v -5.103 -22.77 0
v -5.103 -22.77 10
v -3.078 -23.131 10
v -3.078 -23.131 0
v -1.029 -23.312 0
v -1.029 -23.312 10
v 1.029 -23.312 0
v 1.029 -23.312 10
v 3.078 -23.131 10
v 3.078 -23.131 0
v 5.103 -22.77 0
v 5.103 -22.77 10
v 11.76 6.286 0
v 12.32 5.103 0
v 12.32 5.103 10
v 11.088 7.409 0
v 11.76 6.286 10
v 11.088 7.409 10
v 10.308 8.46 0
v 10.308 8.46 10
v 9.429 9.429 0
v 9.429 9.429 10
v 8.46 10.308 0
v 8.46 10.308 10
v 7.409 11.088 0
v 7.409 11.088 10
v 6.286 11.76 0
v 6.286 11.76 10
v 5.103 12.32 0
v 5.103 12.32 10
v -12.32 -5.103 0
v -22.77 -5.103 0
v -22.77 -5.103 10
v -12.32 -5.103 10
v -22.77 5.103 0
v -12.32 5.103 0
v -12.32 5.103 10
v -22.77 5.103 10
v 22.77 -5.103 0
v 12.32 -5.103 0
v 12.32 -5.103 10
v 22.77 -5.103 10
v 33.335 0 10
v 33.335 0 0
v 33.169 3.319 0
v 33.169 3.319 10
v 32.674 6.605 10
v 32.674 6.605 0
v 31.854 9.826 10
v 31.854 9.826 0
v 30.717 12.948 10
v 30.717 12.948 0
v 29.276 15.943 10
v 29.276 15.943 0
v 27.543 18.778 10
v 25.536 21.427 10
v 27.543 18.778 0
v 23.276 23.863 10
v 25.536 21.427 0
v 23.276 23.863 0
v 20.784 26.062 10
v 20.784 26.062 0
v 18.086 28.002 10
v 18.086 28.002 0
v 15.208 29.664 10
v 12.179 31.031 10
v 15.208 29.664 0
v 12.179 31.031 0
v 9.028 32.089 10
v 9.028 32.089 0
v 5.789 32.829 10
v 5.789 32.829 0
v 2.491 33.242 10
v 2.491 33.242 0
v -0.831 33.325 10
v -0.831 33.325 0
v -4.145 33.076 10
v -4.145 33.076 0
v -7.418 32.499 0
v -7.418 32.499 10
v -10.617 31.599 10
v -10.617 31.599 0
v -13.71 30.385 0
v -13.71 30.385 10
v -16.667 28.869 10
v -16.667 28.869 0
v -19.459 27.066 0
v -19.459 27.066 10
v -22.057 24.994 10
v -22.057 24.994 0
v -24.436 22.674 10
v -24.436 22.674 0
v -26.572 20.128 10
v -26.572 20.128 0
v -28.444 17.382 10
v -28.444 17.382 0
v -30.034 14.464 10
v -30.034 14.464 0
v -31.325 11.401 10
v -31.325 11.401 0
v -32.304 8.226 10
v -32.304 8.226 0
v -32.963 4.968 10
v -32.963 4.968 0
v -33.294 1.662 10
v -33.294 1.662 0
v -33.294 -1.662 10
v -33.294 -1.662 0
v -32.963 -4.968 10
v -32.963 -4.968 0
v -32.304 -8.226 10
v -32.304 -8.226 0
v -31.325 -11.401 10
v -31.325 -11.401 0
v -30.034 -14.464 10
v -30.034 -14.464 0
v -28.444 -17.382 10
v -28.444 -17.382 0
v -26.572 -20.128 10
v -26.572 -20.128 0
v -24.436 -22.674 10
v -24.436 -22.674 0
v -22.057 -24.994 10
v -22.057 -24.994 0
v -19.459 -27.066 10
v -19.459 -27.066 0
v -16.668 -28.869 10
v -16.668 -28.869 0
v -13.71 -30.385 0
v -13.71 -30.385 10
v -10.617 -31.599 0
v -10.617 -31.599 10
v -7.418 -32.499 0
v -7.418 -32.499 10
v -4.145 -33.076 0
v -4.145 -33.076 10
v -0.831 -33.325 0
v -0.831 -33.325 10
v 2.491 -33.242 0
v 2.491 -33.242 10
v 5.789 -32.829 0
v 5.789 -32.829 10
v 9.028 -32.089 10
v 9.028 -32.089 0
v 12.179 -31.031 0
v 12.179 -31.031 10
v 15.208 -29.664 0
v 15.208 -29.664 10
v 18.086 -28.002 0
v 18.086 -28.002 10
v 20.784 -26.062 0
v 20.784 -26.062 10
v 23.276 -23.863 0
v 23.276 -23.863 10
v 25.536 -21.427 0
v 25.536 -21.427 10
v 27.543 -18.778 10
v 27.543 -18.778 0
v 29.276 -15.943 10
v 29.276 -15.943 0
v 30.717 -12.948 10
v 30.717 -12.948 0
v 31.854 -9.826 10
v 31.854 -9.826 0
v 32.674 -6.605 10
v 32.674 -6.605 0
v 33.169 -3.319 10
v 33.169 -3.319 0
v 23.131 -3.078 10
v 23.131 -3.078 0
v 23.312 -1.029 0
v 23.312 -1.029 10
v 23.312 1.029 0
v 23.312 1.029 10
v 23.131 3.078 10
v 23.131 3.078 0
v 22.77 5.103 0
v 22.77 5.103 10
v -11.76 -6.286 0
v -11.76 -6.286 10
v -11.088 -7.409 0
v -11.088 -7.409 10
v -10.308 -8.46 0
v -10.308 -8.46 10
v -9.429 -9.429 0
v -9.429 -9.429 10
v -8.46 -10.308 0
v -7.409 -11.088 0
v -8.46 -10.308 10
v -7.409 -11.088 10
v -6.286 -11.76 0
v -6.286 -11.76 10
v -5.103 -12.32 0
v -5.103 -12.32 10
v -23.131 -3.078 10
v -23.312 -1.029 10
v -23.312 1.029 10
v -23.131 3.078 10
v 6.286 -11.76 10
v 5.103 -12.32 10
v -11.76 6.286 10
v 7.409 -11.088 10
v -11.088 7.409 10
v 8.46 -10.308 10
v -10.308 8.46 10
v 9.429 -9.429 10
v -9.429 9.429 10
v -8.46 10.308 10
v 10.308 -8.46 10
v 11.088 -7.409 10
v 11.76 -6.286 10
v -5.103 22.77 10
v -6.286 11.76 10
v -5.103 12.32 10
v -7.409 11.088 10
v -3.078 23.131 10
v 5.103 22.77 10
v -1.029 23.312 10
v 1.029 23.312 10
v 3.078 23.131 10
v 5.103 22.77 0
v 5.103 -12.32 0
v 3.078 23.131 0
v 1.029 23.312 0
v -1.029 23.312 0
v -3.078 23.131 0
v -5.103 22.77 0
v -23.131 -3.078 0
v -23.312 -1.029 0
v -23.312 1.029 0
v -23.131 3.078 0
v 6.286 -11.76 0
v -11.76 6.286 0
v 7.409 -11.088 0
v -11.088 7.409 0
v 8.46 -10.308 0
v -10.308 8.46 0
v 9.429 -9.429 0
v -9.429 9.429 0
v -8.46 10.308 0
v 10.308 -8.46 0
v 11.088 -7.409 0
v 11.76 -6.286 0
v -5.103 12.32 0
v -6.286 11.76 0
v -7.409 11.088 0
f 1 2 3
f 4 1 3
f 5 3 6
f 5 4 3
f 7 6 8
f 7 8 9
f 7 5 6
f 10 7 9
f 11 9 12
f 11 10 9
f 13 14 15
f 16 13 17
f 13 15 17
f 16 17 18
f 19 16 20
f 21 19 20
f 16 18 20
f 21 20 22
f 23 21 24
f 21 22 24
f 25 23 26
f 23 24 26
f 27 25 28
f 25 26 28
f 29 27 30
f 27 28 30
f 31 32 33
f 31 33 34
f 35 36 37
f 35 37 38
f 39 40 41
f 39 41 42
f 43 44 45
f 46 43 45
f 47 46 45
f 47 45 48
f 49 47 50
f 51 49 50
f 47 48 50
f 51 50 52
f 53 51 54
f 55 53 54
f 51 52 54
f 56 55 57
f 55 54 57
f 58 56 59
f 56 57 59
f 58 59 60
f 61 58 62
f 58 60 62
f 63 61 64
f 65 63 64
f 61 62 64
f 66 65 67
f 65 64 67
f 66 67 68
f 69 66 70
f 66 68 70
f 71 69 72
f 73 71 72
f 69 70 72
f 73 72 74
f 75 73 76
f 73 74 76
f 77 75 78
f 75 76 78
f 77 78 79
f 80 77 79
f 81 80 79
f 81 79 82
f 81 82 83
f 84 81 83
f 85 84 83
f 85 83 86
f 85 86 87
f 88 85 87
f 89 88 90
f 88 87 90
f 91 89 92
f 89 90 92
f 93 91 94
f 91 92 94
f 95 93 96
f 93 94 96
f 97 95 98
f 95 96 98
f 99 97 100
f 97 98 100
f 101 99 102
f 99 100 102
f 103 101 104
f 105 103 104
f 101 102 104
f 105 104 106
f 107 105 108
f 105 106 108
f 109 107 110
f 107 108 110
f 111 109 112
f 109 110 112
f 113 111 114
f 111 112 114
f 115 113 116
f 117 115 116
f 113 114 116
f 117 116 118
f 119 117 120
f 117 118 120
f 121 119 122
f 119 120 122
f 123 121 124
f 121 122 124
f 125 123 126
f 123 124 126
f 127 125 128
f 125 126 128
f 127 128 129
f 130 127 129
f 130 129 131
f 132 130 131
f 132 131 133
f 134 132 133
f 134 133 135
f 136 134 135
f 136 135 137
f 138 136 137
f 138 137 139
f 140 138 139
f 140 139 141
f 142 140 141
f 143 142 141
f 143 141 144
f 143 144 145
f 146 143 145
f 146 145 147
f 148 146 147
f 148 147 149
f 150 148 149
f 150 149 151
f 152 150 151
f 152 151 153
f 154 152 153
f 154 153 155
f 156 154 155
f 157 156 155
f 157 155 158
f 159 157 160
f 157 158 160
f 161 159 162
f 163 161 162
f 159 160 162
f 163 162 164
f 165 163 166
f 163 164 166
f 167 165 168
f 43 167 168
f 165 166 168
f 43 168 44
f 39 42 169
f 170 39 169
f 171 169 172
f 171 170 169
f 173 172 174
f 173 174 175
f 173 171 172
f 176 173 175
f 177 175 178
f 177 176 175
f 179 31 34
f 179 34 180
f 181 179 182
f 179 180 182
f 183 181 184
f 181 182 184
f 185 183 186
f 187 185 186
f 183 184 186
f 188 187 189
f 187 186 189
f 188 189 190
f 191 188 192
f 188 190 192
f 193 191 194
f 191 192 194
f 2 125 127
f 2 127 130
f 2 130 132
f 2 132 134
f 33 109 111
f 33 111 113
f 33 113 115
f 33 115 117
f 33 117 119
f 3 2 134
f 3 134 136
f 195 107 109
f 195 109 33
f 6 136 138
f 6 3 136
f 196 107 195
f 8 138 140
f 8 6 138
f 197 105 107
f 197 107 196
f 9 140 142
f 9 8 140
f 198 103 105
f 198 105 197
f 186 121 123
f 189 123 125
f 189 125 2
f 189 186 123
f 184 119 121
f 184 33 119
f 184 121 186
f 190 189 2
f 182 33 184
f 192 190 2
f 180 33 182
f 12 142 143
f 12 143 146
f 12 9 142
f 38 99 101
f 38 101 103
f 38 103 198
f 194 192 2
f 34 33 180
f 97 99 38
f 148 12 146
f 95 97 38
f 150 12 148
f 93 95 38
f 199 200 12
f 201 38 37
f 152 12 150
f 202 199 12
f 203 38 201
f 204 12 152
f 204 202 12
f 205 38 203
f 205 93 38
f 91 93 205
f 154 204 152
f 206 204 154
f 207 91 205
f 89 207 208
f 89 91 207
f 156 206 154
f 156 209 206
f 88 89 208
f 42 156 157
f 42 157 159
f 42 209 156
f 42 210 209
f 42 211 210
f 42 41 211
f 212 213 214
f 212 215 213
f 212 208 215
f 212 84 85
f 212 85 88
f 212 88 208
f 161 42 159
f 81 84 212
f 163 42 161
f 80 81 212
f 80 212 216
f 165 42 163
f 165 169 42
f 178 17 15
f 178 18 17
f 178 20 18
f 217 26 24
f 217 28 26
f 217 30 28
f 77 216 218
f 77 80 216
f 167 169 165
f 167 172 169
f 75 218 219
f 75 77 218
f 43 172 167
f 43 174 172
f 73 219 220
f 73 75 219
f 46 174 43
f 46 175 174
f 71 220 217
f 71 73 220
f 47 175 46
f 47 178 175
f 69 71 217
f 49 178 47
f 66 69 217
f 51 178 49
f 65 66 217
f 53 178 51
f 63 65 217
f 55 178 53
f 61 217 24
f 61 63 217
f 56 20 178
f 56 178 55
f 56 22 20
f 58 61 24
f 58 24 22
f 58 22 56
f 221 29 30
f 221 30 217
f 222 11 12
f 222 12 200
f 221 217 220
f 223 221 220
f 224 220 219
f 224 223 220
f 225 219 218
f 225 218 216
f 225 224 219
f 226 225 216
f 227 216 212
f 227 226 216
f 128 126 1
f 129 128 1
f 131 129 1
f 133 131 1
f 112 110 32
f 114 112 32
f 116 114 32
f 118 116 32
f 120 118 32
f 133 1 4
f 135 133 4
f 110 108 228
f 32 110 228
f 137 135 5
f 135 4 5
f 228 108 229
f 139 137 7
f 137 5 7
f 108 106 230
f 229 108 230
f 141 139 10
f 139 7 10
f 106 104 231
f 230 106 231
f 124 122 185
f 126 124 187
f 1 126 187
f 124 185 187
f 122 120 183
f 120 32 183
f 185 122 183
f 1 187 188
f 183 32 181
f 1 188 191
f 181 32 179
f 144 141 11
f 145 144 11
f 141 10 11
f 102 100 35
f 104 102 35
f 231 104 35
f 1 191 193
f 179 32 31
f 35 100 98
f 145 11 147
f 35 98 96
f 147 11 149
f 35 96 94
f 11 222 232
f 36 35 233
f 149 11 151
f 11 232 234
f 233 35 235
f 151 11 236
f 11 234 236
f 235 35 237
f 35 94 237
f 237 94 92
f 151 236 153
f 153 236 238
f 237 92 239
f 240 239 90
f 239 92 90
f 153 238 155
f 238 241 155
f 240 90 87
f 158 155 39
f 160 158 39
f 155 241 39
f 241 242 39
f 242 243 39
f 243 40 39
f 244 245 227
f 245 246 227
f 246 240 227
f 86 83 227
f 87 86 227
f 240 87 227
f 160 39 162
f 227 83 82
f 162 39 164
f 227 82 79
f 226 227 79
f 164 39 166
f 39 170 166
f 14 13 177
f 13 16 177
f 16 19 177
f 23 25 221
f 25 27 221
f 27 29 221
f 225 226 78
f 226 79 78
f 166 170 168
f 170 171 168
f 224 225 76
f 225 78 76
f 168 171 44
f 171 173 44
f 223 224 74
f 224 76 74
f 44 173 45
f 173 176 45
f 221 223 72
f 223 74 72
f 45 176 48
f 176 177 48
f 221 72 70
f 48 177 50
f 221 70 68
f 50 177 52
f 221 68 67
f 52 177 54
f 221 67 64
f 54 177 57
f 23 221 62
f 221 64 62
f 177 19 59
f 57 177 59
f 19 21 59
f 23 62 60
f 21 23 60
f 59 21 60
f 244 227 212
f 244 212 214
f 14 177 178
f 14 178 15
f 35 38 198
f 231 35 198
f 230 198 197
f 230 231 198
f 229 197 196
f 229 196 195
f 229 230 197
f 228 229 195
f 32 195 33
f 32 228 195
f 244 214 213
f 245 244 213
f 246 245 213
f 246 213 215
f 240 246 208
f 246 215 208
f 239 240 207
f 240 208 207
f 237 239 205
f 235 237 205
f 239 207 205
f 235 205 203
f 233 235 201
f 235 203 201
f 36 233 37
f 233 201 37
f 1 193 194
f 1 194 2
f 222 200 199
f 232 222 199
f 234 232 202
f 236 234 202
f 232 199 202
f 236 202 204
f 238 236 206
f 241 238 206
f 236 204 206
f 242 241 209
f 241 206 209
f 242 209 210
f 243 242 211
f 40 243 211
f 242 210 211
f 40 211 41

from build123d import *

# Parameters (mm, degrees)
F0_R            = 33.335
F1_DEPTH        = 10
F2_R            = 13.335
F3_DEPTH        = 10
F5_DEPTH        = 10
F5_COPIES_COUNT = 4


# Not quite as in the source:
# - a pattern or mirror of a feature is missing from the dataset's text; its kind, count and spacing are read off the source's solid


with BuildPart() as f1:
    # F0 (on Top) → F1 (new body)
    with BuildSketch(Plane.XY):
        Circle(F0_R)
    extrude(amount=F1_DEPTH)

    # F2 (on face) → F3 (cut, through all)
    with BuildSketch(Plane.XY.offset(10)):
        Circle(F2_R)
    extrude(amount=-F3_DEPTH, mode=Mode.SUBTRACT)

    # F4 (on Top) → F5 (cut, through all)
    with BuildSketch(Plane.XY):
        with BuildLine():
            Line((22.7701726623, 5.1030835706), (12.319933566, 5.1030835706))
            ThreePointArc((12.319933566, 5.1030835706), (13.335, 0), (12.319933566, -5.1030835706))
            Line((12.319933566, -5.1030835706), (22.7701726623, -5.1030835706))
            ThreePointArc((22.7701726623, -5.1030835706), (23.335, 0), (22.7701726623, 5.1030835706))
        make_face()
    f5 = extrude(amount=F5_DEPTH, mode=Mode.SUBTRACT)

    # F5_copies: F5 ×4 about axis
    f5_copies_axis = Axis((0, 0, 0), (0, 0, 1))
    for i in range(1, F5_COPIES_COUNT):
        add(f5.rotate(f5_copies_axis, i * 360 / F5_COPIES_COUNT), mode=Mode.SUBTRACT)


solid = f1.part
